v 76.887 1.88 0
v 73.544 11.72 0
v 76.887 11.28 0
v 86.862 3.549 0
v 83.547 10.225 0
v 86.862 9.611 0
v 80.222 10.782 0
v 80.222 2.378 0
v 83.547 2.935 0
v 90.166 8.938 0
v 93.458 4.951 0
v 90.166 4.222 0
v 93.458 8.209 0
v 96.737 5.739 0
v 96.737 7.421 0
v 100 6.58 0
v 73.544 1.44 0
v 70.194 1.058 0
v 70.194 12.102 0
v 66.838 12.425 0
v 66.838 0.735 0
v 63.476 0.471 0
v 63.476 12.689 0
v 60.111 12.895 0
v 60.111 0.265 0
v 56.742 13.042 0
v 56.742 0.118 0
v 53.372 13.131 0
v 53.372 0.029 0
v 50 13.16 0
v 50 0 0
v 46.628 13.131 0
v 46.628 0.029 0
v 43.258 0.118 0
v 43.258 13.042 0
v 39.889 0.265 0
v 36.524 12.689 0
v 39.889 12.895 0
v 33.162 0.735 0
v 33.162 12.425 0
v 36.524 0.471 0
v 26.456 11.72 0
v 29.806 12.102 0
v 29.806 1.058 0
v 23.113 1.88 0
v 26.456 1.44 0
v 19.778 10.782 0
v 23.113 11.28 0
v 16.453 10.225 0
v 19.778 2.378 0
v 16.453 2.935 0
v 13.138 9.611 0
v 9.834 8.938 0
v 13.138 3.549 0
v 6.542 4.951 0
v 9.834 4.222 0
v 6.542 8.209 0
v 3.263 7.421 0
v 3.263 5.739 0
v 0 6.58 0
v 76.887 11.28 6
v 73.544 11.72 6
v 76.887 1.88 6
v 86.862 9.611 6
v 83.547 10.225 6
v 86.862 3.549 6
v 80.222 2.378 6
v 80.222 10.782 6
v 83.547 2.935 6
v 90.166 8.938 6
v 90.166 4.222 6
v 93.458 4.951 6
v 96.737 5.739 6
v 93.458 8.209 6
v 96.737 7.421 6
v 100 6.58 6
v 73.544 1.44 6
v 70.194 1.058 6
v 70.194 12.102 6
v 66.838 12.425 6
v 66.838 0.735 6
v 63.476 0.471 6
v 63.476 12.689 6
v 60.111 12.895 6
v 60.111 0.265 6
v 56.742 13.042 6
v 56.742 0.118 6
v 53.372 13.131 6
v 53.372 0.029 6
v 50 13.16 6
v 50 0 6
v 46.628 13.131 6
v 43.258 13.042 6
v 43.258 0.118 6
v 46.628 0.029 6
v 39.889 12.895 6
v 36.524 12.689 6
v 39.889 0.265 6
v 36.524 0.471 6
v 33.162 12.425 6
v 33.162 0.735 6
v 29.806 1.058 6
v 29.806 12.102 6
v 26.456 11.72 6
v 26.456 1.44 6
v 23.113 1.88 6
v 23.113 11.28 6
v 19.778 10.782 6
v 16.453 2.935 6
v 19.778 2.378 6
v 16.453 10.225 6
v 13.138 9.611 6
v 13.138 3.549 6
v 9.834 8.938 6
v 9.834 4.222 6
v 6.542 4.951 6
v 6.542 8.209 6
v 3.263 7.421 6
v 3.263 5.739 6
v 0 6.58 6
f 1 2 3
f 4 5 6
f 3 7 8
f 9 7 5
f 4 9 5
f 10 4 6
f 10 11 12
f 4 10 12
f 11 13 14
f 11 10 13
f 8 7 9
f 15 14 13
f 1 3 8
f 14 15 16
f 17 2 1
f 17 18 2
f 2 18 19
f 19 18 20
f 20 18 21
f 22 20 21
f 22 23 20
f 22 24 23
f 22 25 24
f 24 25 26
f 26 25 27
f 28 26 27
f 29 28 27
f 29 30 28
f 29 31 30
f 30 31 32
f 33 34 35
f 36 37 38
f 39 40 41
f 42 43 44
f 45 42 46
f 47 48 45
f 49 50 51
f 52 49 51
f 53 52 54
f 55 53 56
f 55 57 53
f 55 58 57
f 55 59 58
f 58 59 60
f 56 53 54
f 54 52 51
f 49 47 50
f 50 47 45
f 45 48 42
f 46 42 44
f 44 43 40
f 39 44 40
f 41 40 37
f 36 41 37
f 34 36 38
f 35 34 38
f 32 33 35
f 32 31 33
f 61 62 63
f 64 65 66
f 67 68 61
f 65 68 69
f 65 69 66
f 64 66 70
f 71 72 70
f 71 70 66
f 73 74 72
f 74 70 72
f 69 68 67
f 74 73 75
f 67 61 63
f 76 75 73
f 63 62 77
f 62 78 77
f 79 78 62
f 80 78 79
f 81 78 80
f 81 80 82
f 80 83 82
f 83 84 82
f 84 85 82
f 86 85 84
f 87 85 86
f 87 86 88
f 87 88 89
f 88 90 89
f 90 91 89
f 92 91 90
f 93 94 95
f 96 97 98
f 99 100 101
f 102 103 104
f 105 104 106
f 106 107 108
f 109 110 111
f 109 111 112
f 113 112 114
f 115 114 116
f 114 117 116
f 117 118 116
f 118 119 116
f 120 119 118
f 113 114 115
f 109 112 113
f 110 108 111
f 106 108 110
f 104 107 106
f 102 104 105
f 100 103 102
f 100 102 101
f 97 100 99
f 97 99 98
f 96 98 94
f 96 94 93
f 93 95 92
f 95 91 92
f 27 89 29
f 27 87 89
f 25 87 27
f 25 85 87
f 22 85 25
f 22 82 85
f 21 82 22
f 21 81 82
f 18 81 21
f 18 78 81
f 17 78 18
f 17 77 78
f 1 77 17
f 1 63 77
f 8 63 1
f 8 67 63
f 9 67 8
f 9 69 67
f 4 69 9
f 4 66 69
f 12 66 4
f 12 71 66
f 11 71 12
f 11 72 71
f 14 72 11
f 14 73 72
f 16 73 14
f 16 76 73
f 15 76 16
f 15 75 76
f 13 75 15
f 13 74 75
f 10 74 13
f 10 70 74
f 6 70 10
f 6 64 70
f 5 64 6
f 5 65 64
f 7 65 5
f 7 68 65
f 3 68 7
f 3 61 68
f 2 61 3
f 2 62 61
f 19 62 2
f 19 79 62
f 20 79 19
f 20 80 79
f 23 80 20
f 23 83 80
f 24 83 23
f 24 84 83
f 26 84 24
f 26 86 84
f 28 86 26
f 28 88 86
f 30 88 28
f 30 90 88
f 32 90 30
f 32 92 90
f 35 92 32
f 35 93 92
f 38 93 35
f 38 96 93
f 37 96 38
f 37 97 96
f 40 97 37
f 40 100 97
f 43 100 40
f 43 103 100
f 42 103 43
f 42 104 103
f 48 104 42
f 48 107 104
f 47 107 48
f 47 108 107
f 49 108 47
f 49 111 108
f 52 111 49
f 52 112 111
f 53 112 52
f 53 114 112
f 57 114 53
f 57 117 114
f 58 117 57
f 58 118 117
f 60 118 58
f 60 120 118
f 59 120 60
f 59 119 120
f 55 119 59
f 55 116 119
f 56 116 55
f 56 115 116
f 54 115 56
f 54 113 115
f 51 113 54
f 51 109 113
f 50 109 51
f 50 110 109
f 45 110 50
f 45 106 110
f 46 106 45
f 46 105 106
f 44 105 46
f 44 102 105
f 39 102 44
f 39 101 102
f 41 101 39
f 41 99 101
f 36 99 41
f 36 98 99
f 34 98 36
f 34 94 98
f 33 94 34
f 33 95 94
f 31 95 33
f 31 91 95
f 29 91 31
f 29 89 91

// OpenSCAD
$fn = 32;

// ----------------------------------------------------------------------
// Arc profile plate: lens, 60 points
// ----------------------------------------------------------------------

// --- parameters (mm) ---
lens_chord = 100;         // chord length of the lens, X
arc_r = 193.19;           // radius of both arcs
arc_angle = 30;           // angle of each arc, degrees
sagitta = 6.58;           // bulge of each arc (half the lens height)
arc_step = 1;             // sampling step of the arcs, degrees
plate_t = 6;              // plate thickness, Z
fit_tol = 0.05;           // declared fit tolerance (prompt contract)
free_tol = 0.2;           // declared free tolerance (prompt contract)

bbox_y = 2 * sagitta;  // full lens height

profile = [[100, 6.58], [96.737, 7.421], [93.458, 8.209], [90.166, 8.938], [86.862, 9.611], [83.547, 10.225], [80.222, 10.782], [76.887, 11.28], [73.544, 11.72], [70.194, 12.102], [66.838, 12.425], [63.476, 12.689], [60.111, 12.895], [56.742, 13.042], [53.372, 13.131], [50, 13.16], [46.628, 13.131], [43.258, 13.042], [39.889, 12.895], [36.524, 12.689], [33.162, 12.425], [29.806, 12.102], [26.456, 11.72], [23.113, 11.28], [19.778, 10.782], [16.453, 10.225], [13.138, 9.611], [9.834, 8.938], [6.542, 8.209], [3.263, 7.421], [0, 6.58], [3.263, 5.739], [6.542, 4.951], [9.834, 4.222], [13.138, 3.549], [16.453, 2.935], [19.778, 2.378], [23.113, 1.88], [26.456, 1.44], [29.806, 1.058], [33.162, 0.735], [36.524, 0.471], [39.889, 0.265], [43.258, 0.118], [46.628, 0.029], [50, 0], [53.372, 0.029], [56.742, 0.118], [60.111, 0.265], [63.476, 0.471], [66.838, 0.735], [70.194, 1.058], [73.544, 1.44], [76.887, 1.88], [80.222, 2.378], [83.547, 2.935], [86.862, 3.549], [90.166, 4.222], [93.458, 4.951], [96.737, 5.739]];  // primary outline, 60 points, counter clockwise

// --- the one profile operation ---
linear_extrude(height = plate_t) polygon(points = profile);
